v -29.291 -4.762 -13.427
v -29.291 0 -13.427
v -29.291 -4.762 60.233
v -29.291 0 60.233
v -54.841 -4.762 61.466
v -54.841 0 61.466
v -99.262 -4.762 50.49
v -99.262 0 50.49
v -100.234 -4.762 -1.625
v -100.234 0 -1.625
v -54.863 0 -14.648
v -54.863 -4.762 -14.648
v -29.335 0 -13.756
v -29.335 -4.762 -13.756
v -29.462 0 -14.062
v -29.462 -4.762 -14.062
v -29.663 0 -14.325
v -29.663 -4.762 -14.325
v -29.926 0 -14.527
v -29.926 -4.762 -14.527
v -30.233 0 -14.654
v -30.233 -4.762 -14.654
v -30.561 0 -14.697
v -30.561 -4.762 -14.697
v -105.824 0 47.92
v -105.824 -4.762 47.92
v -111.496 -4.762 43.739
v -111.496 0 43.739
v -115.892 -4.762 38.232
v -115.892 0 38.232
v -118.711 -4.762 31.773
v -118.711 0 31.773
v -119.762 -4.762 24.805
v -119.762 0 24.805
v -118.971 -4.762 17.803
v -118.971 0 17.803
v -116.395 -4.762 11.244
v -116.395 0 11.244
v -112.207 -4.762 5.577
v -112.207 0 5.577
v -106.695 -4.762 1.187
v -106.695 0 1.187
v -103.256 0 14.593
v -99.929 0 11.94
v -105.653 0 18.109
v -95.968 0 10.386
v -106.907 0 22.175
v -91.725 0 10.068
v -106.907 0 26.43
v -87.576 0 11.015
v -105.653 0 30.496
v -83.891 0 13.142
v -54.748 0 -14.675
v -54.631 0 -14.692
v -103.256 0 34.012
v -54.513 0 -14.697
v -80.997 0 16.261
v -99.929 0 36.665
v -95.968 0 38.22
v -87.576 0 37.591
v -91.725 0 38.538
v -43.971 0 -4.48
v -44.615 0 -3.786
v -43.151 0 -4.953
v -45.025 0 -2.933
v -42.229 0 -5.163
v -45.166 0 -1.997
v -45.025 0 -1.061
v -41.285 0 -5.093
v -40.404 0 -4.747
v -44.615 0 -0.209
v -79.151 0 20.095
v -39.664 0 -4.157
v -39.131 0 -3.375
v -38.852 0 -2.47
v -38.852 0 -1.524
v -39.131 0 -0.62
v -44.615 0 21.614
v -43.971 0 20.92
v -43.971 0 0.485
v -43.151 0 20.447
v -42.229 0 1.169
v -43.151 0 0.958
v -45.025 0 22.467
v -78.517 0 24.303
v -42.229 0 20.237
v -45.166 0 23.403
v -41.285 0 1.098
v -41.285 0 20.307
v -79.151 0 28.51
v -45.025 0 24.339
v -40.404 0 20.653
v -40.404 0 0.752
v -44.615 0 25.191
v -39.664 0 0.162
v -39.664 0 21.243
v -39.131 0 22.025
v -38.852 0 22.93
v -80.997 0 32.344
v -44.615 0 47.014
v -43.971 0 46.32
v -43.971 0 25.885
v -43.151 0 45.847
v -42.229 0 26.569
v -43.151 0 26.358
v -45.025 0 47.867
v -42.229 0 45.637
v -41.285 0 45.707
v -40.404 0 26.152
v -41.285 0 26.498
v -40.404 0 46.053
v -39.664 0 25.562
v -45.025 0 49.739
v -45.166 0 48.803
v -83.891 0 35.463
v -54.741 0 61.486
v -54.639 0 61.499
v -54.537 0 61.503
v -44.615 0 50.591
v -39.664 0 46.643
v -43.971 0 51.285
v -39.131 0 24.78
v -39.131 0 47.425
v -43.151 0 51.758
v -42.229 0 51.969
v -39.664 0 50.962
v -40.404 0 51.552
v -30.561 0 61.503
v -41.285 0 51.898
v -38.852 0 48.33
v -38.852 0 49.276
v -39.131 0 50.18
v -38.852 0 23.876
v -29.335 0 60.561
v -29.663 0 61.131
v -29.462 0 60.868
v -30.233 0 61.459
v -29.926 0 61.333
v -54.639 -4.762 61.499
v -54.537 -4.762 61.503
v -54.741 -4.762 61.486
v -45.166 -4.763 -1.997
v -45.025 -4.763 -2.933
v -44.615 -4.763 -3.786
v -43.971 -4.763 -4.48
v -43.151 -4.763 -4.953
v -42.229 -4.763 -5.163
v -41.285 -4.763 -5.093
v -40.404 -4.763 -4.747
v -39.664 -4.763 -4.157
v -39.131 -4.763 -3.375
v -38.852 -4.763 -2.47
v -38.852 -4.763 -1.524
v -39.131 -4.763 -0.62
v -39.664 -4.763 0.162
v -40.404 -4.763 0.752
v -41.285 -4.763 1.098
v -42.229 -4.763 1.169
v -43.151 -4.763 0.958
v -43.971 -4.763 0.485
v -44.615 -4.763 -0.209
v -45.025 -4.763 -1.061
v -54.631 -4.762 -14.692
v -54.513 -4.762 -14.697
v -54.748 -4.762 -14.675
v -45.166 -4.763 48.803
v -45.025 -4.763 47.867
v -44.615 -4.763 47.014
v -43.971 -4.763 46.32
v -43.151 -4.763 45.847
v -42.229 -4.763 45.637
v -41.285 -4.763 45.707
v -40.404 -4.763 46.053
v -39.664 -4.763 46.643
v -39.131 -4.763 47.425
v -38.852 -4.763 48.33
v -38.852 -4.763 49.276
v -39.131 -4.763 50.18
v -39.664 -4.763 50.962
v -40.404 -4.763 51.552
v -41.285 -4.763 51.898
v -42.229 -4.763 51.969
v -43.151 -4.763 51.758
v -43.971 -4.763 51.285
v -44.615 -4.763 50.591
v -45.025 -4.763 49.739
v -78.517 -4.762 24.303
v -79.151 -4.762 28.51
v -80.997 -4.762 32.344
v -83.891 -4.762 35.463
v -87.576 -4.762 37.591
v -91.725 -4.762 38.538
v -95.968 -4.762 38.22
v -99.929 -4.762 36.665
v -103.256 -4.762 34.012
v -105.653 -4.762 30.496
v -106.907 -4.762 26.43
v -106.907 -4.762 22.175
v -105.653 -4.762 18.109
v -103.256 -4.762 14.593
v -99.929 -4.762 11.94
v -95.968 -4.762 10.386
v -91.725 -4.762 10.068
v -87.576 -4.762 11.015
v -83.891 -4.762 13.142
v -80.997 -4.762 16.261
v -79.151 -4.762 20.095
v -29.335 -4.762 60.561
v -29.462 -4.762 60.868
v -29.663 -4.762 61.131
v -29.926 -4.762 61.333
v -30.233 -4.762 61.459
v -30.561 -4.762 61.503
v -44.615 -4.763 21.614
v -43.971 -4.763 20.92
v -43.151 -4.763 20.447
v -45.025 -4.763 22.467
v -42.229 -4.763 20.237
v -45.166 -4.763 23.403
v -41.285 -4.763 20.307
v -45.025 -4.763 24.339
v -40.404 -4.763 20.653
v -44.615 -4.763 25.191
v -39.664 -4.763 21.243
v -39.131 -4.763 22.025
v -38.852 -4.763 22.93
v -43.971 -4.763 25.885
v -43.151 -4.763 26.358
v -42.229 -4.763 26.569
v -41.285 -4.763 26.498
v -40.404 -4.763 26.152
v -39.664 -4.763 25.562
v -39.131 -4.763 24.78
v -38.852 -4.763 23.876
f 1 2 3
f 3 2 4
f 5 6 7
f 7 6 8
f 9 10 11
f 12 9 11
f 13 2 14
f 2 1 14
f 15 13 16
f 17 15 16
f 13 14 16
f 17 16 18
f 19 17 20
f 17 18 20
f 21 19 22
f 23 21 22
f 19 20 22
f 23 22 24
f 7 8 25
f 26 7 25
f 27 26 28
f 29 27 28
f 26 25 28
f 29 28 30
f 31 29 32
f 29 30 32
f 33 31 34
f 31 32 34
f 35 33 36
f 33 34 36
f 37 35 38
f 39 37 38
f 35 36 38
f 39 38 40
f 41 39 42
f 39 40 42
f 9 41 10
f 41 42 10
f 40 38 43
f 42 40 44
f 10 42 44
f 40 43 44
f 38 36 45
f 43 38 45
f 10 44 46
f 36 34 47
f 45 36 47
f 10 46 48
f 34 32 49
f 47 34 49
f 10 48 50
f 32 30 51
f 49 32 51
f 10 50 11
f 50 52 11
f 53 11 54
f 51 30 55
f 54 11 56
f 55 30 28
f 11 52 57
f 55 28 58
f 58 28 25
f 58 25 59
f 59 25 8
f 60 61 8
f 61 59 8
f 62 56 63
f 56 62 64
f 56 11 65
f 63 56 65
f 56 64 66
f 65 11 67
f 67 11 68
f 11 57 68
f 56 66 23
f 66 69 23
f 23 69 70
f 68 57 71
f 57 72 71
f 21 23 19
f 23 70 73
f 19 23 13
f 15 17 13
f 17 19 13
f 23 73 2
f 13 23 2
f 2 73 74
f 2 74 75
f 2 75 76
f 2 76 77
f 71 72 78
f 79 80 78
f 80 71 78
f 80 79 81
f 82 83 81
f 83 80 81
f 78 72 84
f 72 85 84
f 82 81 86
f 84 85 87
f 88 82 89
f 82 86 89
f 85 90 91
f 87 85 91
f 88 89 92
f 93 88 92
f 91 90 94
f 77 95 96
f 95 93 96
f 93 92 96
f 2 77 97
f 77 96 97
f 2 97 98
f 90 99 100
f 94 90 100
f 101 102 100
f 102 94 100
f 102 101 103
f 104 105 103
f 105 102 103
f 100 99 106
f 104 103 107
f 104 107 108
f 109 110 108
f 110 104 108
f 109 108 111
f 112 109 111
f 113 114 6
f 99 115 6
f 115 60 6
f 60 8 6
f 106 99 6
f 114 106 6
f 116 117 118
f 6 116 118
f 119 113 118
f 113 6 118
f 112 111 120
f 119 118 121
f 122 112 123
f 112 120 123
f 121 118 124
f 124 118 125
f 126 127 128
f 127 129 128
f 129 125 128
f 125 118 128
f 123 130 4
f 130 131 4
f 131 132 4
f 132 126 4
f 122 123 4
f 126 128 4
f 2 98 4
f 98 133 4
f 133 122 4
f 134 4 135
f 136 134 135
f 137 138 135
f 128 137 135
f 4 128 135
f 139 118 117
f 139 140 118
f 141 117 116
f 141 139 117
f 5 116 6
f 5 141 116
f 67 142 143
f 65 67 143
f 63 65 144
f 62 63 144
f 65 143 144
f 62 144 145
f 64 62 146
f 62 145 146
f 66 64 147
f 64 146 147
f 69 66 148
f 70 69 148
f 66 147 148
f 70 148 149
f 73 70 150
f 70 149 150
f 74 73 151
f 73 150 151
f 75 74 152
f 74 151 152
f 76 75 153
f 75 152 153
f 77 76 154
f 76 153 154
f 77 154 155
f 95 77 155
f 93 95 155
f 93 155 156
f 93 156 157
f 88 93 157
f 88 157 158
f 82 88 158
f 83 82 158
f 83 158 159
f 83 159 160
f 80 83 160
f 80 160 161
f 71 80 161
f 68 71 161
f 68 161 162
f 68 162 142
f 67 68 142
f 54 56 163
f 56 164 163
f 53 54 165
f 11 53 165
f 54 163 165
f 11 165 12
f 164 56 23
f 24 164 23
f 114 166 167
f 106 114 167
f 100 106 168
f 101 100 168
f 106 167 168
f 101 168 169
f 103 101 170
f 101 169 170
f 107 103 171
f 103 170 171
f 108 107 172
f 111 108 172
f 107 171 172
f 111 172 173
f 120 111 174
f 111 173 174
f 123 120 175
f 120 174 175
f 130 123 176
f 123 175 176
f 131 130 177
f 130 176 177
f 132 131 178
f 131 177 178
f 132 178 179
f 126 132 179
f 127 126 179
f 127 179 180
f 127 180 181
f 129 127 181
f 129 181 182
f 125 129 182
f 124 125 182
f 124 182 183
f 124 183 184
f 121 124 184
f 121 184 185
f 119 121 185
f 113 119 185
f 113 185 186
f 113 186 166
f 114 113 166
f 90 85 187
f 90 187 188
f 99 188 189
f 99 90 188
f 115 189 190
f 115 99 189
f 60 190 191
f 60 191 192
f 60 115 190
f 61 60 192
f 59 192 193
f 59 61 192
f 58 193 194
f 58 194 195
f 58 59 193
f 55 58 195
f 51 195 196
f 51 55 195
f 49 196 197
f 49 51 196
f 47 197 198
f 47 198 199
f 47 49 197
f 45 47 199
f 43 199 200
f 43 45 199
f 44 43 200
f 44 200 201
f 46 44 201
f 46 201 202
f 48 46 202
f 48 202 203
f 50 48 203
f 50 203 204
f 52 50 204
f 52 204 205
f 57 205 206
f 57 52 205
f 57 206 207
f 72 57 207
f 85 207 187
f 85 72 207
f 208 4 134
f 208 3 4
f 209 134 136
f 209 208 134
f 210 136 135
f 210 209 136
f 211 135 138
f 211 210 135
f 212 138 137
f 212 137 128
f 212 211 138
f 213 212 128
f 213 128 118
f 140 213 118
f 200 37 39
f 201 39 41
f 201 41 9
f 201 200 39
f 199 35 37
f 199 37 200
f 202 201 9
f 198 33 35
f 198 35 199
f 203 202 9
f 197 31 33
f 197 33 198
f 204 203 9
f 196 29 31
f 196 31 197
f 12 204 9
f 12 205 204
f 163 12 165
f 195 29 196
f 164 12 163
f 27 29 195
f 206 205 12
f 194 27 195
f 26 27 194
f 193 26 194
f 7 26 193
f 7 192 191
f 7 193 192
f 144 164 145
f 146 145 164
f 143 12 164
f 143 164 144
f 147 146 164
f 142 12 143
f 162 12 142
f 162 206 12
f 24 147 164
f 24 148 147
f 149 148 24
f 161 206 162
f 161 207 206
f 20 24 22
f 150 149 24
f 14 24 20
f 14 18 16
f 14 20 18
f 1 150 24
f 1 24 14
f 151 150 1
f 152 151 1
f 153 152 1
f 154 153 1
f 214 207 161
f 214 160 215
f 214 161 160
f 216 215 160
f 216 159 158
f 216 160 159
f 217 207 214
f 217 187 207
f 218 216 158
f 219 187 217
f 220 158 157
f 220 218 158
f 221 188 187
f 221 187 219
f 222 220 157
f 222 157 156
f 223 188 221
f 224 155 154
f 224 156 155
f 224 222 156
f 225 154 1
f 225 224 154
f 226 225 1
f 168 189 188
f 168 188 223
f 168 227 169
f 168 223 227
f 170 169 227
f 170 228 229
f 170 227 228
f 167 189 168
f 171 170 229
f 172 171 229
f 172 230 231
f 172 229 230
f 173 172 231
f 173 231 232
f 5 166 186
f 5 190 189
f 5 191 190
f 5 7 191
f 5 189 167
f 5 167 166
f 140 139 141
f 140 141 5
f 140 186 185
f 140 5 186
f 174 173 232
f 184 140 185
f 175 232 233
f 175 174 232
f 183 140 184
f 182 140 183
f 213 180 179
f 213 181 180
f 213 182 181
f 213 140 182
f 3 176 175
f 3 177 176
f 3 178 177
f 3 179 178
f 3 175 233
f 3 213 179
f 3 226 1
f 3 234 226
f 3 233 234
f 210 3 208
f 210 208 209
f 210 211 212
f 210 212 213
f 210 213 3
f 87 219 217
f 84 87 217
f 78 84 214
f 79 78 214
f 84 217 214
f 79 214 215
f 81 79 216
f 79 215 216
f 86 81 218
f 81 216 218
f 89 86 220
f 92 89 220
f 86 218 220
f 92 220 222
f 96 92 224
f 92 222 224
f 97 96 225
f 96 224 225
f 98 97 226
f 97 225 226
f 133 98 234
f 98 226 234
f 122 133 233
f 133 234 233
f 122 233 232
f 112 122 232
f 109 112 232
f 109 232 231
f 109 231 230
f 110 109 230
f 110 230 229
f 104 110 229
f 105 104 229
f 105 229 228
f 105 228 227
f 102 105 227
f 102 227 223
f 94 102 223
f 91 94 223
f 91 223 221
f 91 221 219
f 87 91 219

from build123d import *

# Parameters (mm, degrees)
F0_R     = 14.2748
F1_DEPTH = 4.7625
F2_D     = 6.35
F3_R     = 1.27


with BuildPart() as f1:
    # F0 (on Front) → F1 (new body)
    with BuildSketch(Plane.XZ):
        with BuildLine():
            Line((-29.2914260553, -14.6972390882), (-29.2914260553, 61.5027609118))
            Line((-29.2914260553, 61.5027609118), (-54.6914260553, 61.5027609118))
            Line((-54.6914260553, 61.5027609118), (-99.2620043736, 50.4898616483))
            ThreePointArc((-99.2620043736, 50.4898616483), (-119.7615401749, 24.805395053), (-100.2335245042, -1.6252575368))
            Line((-100.2335245042, -1.6252575368), (-54.6914260553, -14.6972390882))
            Line((-54.6914260553, -14.6972390882), (-29.2914260553, -14.6972390882))
        make_face()
        with Locations((-92.7914260553, 24.3026233199)):
            Circle(F0_R, mode=Mode.SUBTRACT)
    extrude(amount=F1_DEPTH)

    # F2 (through all)
    with Locations(Plane(origin=(0, 0, 0), x_dir=(1, 0, 0), z_dir=(0, 1, 0))):
        with Locations((-41.9914260553, -48.8027609118), (-41.9914260553, -23.4027609118), (-41.9914260553, 1.9972390882)):
            Hole(F2_D / 2)

    # F3
    f3_edges = [f1.edges().sort_by_distance(p)[0] for p in [
        (-29.291426, -2.38125, 61.502761),
        (-29.291426, -2.38125, -14.697239),
        (-54.691426, -2.38125, 61.502761),
        (-54.691426, -2.38125, -14.697239),
    ]]
    fillet(f3_edges, radius=F3_R)


solid = f1.part
